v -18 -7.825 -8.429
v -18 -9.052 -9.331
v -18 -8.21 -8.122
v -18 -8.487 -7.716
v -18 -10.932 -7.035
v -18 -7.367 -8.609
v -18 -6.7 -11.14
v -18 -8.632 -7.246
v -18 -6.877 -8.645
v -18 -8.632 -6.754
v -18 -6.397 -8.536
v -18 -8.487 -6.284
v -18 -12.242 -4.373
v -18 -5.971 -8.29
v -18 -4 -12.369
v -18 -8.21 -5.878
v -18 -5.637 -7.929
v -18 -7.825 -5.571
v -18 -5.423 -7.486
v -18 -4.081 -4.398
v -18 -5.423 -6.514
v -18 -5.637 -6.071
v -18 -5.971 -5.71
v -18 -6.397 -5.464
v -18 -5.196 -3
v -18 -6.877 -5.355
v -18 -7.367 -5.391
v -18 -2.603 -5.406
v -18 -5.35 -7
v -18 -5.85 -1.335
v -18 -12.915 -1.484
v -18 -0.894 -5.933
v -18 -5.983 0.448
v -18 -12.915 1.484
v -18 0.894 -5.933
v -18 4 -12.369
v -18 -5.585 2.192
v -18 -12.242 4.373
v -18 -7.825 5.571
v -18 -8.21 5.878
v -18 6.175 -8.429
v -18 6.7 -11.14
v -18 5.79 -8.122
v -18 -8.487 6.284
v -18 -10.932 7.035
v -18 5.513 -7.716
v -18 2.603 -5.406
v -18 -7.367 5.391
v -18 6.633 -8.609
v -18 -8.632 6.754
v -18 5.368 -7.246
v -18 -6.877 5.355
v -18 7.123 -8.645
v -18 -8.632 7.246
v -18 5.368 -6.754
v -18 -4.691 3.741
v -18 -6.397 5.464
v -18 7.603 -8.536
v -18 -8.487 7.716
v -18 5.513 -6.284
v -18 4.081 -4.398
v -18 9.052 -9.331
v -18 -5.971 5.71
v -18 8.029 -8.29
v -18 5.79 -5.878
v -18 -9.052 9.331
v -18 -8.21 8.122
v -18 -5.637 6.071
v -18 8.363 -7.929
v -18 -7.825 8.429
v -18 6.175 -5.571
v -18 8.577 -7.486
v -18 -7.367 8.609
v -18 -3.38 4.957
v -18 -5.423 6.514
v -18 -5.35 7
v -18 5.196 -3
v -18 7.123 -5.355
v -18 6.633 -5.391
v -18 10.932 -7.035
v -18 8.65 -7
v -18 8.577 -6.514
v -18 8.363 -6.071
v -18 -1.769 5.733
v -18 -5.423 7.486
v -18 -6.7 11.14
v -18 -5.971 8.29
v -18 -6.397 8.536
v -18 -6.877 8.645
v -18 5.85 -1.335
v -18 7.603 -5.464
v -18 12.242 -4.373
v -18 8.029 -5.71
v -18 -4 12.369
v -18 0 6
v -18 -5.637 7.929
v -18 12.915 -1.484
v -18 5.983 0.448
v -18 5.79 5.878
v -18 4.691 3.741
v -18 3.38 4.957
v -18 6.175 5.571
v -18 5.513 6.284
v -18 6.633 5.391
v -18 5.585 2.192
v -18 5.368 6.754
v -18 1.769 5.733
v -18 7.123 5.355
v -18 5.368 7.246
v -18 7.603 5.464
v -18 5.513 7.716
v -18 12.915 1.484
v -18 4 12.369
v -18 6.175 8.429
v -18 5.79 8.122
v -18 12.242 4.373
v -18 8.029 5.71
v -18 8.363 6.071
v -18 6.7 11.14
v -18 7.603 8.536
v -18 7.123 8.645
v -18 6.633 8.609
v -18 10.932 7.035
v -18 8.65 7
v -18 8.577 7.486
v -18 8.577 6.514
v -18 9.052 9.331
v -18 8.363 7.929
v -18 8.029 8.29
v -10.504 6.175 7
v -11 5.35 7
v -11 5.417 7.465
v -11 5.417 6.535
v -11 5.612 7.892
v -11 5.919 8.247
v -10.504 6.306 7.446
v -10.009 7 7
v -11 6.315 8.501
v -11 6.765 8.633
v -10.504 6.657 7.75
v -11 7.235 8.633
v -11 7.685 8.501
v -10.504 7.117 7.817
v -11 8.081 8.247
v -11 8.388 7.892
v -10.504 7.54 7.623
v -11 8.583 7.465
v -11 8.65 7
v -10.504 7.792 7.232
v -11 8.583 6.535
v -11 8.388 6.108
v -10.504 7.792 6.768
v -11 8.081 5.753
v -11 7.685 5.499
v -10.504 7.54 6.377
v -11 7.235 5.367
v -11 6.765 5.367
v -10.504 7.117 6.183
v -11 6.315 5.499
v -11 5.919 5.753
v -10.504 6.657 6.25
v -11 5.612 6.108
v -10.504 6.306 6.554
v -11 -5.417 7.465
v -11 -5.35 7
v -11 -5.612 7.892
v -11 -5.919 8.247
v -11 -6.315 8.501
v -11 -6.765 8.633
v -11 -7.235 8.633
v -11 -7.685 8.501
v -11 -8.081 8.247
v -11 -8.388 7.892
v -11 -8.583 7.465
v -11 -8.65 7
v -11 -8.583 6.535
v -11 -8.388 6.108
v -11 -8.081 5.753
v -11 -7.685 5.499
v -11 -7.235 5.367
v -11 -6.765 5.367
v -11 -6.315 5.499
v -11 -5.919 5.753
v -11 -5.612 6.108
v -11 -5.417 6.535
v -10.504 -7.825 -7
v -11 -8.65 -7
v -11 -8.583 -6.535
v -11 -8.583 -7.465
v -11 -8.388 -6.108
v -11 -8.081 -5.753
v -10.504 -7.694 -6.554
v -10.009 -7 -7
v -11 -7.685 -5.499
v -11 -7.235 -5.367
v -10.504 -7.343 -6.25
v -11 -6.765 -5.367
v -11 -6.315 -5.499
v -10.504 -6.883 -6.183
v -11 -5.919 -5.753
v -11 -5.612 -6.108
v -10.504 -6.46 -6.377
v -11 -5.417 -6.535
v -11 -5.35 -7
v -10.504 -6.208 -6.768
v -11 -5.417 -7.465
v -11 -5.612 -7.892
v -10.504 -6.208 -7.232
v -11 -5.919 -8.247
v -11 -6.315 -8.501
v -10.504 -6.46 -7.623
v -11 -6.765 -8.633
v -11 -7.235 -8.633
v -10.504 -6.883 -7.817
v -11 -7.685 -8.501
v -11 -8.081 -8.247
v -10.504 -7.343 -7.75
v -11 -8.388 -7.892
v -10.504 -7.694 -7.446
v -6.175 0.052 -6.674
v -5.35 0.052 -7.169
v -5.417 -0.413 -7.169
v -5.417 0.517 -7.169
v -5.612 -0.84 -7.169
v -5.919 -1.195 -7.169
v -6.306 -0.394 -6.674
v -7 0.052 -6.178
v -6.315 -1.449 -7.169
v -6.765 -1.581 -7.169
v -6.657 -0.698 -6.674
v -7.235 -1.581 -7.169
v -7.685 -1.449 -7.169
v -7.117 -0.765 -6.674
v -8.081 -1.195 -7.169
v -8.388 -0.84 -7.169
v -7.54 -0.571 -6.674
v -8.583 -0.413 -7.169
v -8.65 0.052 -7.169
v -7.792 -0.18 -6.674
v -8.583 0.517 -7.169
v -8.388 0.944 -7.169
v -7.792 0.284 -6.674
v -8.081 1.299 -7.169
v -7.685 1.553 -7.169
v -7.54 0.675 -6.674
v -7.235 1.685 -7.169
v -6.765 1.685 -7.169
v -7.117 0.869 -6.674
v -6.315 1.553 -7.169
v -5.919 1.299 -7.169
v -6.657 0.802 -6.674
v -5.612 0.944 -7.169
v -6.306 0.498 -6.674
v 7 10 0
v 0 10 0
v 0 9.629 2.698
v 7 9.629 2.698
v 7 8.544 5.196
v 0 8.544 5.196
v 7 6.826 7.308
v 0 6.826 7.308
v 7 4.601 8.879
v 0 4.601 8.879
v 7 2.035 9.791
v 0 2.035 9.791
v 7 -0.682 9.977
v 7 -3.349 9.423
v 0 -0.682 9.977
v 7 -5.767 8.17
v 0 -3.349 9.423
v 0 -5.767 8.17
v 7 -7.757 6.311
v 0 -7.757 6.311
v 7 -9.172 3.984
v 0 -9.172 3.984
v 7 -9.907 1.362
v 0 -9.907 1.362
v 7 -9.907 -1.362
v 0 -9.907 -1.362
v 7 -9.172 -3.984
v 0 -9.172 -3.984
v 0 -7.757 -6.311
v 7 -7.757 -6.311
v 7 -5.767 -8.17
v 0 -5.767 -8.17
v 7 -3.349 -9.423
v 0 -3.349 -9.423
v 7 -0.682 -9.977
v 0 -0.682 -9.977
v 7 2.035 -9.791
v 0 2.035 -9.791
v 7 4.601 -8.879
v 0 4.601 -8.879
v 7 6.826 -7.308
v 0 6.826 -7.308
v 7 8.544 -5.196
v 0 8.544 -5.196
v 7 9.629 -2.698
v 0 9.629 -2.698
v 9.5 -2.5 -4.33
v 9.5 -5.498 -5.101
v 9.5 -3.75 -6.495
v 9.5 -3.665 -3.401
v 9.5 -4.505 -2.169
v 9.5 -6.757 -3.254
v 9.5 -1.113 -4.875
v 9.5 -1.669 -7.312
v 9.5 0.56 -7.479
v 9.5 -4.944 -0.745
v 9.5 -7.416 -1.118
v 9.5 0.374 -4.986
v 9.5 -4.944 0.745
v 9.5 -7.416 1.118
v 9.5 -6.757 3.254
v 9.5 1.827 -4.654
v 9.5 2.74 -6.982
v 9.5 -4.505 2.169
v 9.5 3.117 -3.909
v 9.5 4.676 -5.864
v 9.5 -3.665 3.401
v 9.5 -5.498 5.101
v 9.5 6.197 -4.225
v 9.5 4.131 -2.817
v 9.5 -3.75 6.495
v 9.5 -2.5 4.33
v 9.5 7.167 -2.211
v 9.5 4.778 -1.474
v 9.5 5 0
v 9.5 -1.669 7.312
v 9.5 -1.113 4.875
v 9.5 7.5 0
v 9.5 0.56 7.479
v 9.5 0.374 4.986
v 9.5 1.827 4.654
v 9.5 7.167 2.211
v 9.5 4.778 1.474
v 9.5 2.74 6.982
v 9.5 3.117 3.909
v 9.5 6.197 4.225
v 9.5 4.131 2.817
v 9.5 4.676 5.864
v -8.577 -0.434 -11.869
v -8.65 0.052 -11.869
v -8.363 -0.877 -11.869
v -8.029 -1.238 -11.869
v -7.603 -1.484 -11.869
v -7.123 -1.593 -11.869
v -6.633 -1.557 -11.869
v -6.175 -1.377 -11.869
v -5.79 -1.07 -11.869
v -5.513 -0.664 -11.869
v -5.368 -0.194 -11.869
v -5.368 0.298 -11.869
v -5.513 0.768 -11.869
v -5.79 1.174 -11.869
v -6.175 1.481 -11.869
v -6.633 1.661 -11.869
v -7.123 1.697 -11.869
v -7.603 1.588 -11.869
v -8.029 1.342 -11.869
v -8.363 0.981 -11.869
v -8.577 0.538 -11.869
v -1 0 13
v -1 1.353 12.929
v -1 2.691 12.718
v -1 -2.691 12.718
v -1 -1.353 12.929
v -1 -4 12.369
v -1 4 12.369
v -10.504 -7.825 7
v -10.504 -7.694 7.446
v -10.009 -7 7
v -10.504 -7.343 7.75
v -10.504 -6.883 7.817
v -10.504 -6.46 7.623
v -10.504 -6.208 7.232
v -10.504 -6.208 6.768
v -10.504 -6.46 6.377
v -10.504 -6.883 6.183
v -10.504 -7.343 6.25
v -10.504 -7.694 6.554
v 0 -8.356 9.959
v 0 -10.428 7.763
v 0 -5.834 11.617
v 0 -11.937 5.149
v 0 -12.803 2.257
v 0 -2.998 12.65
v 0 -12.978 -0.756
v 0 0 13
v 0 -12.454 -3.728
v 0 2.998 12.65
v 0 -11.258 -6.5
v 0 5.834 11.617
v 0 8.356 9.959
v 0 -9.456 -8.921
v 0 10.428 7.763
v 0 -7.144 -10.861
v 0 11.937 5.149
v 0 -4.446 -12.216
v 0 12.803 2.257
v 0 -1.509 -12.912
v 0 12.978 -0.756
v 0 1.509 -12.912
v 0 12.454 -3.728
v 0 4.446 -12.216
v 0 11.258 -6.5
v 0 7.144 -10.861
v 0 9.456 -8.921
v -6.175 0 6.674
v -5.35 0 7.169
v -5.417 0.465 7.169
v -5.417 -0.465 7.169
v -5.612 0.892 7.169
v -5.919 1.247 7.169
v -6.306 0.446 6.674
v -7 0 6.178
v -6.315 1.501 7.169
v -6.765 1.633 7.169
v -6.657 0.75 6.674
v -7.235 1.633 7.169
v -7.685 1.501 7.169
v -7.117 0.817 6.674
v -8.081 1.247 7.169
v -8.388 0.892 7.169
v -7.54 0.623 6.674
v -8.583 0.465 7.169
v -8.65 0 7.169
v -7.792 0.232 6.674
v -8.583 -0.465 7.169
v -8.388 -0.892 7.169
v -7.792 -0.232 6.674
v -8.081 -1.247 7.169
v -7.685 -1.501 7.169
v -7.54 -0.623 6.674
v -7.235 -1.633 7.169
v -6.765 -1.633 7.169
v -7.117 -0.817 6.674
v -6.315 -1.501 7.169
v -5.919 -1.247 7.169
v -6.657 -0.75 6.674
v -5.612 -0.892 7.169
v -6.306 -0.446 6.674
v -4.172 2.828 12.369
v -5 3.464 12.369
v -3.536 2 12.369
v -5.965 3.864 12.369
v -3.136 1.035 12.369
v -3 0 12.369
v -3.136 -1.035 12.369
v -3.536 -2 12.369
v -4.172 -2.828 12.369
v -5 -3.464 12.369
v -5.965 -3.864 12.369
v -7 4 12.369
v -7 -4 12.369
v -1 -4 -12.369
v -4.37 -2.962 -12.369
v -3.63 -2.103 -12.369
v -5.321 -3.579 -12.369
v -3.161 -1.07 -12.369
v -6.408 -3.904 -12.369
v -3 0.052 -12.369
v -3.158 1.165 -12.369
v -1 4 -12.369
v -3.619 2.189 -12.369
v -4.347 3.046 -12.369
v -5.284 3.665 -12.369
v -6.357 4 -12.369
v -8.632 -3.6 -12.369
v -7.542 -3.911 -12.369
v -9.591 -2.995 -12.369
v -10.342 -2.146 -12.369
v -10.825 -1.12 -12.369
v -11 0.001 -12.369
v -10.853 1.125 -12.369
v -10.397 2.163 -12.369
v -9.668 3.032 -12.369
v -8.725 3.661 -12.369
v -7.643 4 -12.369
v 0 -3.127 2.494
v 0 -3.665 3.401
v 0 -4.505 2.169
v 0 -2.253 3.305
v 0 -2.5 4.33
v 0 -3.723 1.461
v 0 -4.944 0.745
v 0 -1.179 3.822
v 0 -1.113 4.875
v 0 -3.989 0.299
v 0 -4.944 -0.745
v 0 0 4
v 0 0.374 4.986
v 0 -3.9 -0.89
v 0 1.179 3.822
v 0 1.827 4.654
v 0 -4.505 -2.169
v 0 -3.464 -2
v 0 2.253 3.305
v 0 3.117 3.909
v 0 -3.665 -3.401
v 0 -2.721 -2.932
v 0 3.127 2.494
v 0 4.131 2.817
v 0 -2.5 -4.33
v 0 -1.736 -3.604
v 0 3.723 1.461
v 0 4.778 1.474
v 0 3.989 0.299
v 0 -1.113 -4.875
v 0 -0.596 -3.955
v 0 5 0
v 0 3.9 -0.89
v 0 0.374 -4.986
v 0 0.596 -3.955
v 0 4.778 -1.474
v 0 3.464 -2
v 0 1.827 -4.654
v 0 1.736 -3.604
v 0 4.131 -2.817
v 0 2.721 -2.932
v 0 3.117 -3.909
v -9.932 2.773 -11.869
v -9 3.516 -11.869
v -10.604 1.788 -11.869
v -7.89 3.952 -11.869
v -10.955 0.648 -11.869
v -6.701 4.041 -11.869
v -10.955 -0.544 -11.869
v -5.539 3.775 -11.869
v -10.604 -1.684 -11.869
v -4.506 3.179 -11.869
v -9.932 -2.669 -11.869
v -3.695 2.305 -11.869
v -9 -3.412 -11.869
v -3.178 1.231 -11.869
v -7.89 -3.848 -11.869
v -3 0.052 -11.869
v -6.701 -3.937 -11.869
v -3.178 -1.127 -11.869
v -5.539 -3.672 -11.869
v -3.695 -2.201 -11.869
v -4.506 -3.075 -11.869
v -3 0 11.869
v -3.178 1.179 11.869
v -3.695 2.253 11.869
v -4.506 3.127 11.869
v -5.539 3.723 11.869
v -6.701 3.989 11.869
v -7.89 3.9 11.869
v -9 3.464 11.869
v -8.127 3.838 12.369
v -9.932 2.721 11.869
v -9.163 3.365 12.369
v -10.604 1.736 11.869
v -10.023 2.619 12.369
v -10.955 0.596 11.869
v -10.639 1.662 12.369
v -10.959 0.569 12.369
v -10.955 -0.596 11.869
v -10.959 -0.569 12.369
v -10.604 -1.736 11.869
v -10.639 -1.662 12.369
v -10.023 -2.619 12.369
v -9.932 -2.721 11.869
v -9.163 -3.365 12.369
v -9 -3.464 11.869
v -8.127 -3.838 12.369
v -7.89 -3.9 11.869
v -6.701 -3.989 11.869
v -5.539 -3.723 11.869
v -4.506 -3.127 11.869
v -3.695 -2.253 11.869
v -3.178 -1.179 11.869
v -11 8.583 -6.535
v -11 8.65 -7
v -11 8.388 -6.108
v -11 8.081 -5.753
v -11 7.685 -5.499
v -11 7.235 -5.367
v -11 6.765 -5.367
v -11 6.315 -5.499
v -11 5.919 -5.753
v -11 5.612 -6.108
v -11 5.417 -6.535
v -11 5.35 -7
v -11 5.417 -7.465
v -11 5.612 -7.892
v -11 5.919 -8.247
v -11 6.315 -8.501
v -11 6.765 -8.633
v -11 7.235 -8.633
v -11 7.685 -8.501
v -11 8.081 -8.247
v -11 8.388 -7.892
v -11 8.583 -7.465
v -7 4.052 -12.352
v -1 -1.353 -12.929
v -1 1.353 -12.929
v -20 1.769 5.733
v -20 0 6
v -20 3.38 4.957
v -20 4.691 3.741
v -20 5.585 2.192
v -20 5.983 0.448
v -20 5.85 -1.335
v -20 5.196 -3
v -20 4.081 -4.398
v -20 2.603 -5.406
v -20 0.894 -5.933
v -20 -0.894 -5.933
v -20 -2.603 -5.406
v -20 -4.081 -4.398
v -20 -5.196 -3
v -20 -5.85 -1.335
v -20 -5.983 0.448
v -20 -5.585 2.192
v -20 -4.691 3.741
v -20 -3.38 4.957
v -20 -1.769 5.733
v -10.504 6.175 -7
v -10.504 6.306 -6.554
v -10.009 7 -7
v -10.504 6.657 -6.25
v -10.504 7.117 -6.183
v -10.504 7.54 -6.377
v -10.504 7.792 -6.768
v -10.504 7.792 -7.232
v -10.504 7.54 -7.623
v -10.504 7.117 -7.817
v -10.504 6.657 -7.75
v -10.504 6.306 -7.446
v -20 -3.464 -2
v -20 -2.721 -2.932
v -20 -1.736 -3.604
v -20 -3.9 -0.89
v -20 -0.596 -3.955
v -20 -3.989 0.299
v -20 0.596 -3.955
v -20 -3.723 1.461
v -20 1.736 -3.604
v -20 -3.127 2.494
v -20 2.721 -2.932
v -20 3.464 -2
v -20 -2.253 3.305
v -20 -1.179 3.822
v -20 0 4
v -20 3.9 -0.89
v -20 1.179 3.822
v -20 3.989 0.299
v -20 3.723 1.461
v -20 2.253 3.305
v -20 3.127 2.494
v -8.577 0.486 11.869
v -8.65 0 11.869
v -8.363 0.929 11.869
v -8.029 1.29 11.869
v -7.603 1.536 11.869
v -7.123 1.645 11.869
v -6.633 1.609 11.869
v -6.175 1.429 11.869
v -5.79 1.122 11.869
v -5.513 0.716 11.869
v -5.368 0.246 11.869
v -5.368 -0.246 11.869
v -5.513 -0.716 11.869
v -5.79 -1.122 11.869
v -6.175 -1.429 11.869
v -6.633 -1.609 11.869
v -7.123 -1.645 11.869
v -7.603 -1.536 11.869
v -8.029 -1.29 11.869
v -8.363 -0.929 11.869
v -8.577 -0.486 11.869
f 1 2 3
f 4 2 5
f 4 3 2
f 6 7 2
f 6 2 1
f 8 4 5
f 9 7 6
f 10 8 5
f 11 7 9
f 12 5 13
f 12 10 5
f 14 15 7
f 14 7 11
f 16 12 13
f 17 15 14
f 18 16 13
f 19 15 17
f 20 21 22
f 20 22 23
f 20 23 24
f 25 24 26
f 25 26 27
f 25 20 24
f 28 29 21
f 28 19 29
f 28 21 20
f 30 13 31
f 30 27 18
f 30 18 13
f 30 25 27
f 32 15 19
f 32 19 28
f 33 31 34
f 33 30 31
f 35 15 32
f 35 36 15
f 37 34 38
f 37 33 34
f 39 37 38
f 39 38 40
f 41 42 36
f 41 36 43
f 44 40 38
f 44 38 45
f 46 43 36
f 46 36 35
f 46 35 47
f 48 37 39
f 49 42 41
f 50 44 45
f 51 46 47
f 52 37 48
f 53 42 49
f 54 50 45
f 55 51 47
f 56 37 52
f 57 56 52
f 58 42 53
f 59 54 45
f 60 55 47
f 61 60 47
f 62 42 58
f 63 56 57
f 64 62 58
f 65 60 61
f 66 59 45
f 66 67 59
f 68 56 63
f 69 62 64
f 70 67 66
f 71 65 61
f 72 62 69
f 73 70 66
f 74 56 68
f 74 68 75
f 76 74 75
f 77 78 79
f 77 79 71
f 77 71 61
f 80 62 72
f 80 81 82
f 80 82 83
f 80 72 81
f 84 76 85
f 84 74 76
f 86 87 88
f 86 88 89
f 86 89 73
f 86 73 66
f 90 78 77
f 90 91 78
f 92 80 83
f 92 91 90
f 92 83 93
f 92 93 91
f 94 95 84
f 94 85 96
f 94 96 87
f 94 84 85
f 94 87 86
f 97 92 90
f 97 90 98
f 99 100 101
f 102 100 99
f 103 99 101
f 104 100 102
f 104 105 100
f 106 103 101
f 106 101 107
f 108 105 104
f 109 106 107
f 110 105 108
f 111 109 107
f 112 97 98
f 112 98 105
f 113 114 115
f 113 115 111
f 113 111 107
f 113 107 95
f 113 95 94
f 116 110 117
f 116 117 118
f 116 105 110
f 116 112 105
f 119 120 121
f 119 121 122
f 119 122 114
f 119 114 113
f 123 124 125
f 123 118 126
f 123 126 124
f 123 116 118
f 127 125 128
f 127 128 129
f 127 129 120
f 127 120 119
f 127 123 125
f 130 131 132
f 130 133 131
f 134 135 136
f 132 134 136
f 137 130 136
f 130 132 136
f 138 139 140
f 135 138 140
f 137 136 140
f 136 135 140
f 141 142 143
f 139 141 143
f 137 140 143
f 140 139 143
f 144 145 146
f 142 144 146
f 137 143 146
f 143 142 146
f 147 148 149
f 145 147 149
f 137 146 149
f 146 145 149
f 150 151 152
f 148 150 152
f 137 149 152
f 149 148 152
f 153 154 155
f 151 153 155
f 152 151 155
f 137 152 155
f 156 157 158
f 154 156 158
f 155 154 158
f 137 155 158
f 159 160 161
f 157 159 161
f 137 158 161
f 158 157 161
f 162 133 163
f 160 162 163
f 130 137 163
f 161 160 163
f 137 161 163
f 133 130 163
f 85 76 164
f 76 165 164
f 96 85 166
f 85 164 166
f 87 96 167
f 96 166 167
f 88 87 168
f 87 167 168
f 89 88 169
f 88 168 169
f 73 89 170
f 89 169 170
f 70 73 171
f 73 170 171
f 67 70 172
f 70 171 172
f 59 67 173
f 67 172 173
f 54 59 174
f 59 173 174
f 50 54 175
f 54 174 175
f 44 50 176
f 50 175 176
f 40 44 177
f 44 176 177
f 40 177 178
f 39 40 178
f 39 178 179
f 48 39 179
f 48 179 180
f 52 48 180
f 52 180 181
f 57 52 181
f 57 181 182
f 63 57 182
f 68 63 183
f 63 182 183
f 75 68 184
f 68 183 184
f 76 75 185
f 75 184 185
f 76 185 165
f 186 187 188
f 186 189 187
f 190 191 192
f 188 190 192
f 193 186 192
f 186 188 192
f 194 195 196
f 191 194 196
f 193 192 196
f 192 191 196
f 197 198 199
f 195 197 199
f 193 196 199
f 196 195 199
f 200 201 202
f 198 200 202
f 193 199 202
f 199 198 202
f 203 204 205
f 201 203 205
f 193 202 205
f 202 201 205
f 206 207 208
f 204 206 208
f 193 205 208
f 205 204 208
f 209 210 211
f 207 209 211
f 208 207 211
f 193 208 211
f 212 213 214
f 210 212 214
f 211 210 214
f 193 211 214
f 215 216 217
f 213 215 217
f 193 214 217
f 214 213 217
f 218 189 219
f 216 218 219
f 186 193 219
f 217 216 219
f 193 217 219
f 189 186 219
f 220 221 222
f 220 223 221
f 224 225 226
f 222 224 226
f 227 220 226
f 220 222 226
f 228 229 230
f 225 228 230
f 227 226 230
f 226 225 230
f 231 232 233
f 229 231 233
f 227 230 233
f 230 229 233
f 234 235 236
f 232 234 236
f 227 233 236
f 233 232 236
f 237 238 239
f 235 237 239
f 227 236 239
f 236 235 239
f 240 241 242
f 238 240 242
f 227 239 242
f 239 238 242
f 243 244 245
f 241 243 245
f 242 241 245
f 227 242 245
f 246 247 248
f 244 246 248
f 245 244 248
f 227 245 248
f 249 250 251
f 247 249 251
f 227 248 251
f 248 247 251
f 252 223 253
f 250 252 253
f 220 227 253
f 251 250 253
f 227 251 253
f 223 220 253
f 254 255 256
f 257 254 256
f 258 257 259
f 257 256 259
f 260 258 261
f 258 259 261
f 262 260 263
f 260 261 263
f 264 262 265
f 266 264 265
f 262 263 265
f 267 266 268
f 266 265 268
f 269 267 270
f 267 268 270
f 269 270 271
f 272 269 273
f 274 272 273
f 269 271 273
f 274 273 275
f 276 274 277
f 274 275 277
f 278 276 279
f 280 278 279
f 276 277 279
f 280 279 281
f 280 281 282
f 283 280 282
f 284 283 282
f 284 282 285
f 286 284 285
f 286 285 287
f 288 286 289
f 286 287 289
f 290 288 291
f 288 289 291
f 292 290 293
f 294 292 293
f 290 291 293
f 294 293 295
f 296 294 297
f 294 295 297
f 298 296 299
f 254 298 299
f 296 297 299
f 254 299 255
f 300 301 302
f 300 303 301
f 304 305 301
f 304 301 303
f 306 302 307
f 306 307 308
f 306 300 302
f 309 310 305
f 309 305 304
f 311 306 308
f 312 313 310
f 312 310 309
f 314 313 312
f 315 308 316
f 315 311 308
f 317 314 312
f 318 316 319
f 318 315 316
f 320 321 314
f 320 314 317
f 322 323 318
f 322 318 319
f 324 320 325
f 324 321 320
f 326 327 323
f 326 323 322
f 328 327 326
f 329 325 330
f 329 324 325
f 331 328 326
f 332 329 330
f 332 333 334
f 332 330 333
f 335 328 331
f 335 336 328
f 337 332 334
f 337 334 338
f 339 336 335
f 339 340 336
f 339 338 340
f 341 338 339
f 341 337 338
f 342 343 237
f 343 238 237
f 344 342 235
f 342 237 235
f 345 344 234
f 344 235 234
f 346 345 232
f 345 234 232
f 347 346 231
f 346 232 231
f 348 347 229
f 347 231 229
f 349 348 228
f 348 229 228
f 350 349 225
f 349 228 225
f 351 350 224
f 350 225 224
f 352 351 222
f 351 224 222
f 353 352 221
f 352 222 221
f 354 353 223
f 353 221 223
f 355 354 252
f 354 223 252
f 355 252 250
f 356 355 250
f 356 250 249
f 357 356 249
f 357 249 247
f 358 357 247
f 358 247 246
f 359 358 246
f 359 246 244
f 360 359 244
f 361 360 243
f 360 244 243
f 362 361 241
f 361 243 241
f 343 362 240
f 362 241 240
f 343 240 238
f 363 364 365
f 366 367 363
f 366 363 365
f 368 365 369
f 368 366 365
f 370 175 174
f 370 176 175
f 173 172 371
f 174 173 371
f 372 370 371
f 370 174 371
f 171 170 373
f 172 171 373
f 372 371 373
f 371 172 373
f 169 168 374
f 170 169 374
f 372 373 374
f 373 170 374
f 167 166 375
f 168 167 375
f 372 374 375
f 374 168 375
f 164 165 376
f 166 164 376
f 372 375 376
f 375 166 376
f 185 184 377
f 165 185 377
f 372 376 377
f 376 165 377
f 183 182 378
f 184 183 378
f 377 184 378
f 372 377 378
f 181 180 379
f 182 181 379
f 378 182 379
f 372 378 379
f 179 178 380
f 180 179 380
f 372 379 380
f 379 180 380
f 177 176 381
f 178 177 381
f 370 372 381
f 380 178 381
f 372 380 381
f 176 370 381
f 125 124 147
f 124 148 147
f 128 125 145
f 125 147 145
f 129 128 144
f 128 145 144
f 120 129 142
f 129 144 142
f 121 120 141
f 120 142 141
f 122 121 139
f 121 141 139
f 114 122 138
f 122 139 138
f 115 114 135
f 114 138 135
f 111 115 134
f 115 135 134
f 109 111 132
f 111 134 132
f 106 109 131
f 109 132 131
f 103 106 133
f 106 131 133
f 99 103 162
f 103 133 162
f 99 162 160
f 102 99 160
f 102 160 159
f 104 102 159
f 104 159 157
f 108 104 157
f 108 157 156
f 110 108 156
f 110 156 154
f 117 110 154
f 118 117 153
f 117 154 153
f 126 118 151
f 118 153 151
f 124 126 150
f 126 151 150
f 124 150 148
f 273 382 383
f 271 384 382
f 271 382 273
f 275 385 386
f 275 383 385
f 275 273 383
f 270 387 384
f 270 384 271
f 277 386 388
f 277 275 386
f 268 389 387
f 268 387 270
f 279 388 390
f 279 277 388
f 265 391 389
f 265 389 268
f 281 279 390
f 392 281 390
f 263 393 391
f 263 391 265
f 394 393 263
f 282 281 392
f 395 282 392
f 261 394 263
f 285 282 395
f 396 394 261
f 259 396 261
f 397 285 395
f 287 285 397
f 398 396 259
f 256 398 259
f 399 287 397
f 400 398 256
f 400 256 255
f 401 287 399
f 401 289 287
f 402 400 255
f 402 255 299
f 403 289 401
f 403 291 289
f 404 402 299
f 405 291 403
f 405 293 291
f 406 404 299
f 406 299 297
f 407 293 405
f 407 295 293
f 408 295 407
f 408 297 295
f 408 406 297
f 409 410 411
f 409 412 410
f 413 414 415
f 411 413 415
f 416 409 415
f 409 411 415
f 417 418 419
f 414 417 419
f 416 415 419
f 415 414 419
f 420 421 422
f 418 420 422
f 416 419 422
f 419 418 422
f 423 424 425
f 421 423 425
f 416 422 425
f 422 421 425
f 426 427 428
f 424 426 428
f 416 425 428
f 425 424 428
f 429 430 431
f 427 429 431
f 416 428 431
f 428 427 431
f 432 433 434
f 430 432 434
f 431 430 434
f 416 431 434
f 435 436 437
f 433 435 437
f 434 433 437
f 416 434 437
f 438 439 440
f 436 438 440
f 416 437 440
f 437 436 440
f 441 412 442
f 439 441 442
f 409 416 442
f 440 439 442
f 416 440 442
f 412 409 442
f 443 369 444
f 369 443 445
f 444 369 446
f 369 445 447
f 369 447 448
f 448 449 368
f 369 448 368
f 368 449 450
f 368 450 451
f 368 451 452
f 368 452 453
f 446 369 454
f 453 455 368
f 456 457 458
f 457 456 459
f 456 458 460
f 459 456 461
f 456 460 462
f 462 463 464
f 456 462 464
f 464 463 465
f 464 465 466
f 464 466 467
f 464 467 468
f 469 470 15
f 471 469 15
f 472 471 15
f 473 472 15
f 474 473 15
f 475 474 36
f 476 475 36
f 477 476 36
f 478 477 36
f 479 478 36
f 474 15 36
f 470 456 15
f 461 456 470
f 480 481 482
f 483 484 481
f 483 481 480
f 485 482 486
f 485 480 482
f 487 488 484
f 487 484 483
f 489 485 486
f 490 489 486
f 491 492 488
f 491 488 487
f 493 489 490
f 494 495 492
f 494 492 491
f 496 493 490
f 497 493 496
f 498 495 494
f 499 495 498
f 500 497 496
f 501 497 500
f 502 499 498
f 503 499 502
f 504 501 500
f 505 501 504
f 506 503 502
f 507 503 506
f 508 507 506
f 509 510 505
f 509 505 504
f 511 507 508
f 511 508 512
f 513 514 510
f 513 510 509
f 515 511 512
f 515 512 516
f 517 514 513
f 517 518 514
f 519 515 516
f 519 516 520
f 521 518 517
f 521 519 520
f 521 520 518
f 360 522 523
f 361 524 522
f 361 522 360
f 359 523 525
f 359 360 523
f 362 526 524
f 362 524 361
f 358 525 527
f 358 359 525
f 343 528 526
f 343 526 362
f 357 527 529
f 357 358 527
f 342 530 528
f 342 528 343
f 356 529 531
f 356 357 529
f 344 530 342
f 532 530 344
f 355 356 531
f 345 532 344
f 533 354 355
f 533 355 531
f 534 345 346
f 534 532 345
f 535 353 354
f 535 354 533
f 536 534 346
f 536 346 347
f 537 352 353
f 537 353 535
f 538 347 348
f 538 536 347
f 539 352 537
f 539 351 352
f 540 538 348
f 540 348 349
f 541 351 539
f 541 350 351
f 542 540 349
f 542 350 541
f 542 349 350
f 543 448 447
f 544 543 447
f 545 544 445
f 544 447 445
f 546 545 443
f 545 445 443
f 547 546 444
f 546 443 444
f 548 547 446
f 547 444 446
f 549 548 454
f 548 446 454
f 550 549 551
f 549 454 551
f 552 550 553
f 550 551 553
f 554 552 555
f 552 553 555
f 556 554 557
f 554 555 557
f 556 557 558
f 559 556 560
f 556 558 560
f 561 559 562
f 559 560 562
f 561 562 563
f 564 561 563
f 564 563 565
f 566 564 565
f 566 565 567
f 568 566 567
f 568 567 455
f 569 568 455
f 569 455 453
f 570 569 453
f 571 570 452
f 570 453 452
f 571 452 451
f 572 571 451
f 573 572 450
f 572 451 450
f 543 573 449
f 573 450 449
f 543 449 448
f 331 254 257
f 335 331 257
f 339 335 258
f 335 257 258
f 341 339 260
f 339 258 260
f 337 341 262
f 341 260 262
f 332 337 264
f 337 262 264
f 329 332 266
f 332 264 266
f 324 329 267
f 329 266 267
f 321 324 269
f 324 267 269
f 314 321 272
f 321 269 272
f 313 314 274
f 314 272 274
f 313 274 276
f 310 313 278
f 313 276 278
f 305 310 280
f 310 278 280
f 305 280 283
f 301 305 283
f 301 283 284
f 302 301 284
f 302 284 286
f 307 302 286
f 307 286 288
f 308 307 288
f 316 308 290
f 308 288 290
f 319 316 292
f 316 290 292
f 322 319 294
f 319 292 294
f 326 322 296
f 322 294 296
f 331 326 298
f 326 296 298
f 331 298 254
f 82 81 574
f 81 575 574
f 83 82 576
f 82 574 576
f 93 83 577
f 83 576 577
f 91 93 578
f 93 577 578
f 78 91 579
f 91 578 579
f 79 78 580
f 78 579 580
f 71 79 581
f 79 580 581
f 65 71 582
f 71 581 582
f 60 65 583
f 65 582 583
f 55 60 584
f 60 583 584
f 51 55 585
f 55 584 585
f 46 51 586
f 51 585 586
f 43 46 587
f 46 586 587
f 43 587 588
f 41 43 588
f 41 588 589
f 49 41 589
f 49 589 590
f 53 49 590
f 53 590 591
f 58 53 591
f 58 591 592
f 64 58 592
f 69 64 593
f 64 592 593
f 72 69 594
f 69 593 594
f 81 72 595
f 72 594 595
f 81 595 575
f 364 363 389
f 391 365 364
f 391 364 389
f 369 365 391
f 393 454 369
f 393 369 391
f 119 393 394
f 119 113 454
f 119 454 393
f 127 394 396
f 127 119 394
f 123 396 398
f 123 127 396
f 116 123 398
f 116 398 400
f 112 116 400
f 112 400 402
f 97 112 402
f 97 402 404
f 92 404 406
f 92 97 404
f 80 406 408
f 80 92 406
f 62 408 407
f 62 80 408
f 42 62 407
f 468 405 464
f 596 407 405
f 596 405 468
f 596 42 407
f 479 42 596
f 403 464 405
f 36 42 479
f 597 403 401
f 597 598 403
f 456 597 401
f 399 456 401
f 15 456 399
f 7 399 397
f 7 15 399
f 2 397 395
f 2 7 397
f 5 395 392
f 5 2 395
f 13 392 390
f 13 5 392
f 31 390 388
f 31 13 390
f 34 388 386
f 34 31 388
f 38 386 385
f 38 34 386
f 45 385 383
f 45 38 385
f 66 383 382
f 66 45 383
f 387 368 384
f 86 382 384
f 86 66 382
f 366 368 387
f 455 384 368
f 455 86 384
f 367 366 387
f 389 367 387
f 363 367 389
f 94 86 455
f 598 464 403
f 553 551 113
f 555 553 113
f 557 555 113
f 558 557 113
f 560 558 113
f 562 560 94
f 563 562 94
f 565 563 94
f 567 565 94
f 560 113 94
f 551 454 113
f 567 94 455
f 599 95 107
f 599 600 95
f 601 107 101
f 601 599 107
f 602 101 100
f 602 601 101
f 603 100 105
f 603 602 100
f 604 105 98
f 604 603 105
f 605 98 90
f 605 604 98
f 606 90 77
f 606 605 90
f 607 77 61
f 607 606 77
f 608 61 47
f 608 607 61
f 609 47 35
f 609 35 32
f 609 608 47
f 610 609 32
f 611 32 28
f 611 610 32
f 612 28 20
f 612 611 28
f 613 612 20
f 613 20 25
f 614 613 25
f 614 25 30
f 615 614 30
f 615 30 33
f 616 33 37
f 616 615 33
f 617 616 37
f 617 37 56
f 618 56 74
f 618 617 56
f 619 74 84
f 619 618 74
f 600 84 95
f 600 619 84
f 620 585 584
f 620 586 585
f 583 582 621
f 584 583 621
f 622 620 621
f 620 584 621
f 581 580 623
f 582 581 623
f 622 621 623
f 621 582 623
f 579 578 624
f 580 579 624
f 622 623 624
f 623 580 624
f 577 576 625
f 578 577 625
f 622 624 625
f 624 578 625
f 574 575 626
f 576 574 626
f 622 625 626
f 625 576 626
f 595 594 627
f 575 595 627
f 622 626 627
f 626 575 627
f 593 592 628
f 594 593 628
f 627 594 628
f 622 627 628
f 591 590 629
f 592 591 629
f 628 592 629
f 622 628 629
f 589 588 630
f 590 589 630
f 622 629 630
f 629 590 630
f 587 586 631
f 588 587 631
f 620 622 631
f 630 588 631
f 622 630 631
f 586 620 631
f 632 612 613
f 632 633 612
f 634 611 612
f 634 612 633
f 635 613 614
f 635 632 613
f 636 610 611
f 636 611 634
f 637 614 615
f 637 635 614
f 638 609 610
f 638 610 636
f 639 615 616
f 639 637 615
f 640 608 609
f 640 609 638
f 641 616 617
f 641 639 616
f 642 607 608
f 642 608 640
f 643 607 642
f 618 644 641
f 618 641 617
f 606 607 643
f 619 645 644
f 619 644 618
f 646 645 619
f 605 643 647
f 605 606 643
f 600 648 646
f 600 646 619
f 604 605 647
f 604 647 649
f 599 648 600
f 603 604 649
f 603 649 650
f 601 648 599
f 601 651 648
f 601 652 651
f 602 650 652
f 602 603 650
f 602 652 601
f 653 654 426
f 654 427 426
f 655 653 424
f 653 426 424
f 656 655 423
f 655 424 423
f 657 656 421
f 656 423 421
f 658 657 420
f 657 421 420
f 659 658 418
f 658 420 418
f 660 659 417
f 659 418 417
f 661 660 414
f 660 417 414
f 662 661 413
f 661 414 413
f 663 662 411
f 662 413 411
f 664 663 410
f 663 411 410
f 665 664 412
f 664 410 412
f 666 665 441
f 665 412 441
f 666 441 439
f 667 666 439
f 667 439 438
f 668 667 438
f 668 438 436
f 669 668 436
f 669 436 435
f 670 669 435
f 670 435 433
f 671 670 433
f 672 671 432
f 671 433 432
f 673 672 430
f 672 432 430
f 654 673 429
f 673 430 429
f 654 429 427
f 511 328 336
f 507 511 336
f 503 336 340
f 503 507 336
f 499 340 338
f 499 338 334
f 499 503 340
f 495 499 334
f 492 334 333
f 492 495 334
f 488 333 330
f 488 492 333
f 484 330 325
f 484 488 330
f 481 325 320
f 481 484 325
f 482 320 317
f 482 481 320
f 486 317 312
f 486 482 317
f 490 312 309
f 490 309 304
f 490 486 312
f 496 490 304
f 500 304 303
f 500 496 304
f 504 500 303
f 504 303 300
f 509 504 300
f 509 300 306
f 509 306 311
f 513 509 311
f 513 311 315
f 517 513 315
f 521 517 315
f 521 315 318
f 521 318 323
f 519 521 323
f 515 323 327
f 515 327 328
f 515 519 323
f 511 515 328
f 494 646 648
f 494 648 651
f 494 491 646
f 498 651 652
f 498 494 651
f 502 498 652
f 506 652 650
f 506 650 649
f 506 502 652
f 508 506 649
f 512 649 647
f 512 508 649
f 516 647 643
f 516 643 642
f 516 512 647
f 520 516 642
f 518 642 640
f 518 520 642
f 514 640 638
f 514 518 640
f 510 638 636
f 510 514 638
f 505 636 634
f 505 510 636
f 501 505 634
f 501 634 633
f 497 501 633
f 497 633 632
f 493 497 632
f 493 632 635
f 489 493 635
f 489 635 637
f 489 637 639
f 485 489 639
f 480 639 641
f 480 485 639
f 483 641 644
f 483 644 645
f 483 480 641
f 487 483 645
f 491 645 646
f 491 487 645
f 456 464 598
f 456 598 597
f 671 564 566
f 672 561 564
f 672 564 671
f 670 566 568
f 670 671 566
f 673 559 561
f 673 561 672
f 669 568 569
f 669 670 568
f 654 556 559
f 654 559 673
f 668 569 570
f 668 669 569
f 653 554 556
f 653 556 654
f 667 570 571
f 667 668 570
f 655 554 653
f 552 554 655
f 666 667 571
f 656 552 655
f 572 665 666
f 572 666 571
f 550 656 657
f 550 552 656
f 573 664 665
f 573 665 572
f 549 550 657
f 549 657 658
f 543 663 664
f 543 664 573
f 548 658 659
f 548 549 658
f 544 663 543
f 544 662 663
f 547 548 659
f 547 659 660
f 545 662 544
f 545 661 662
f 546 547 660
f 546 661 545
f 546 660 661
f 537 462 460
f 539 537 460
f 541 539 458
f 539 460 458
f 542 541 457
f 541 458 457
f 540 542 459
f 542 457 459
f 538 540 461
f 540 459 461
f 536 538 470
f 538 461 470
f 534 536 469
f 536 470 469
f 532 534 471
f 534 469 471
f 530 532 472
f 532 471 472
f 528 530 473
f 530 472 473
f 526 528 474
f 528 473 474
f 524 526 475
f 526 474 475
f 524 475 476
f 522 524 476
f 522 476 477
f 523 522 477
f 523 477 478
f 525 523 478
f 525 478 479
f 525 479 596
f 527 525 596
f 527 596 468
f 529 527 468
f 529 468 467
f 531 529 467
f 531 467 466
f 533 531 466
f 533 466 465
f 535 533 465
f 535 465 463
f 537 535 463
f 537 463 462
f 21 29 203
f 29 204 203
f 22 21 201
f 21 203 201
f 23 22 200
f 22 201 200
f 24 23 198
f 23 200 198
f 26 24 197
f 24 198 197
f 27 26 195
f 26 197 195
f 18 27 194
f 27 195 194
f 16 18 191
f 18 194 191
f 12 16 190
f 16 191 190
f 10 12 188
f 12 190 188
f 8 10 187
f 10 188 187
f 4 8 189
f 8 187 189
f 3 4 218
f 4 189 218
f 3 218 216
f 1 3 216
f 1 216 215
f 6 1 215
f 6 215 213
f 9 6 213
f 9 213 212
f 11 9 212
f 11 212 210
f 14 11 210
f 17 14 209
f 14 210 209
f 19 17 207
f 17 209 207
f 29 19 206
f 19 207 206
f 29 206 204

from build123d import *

# Parameters (mm, degrees)
F3_D      = 3.3
F3_DEPTH  = 7
F3_TIP    = 0.9914200214
F4_R      = 10
F4_R_2    = 5
F5_DEPTH  = 9.5
F6_SIZE   = 2.5
F8_DEPTH  = 17
F10_D     = 3.3
F10_DEPTH = 5.2
F10_TIP   = 0.9914200214
F11_R     = 4
F12_DEPTH = 0.5
F14_D     = 3.3
F14_DEPTH = 5.2
F14_TIP   = 0.9914200214
F15_R     = 4
F16_DEPTH = 0.5


with BuildPart() as f1:
    # F0 (on Front) → F1 (revolve)
    with BuildSketch(Plane.XZ):
        Polygon((-20, 4), (0, 4), (0, 13), (-18, 13), (-18, 6), (-20, 6), align=None)
    revolve(axis=Axis((-7.6375159387, 0, 0), (-1, 0, 0)))

    # F3
    with Locations(Plane(origin=(-18, 0, 0), x_dir=(0, -1, 0), z_dir=(-1, 0, 0))):
        with Locations((-7, 7), (7, 7), (-7, -7), (7, -7)):
            Hole(F3_D / 2, depth=F3_DEPTH)
            with Locations((0, 0, -(F3_DEPTH + F3_TIP / 2))):  # 118° drill point
                Cone(0, F3_D / 2, F3_TIP, mode=Mode.SUBTRACT)

    # F4 (on face) → F5 (join)
    with BuildSketch(Plane.YZ):
        Circle(F4_R)
        Circle(F4_R_2, mode=Mode.SUBTRACT)
    extrude(amount=F5_DEPTH)

    # F6
    f6_edges = [f1.edges().sort_by_distance(p)[0] for p in [
        (9.5, -10, 0),
    ]]
    chamfer(f6_edges, length=F6_SIZE)

    # F7 (on face) → F8 (cut)
    with BuildSketch(Plane(origin=(-18, 0, 0), x_dir=(0, -1, 0), z_dir=(-1, 0, 0))):
        with BuildLine():
            Line((-4, 12.3693168769), (4, 12.3693168769))
            ThreePointArc((4, 12.3693168769), (0, 13), (-4, 12.3693168769))
        make_face()
        with BuildLine():
            Line((4, -12.3693168769), (-4, -12.3693168769))
            ThreePointArc((-4, -12.3693168769), (0, -13), (4, -12.3693168769))
        make_face()
    extrude(amount=-F8_DEPTH, mode=Mode.SUBTRACT)

    # F10
    with Locations(Plane.XY.offset(12.3693168769)):
        with Locations((-7, 0)):
            Hole(F10_D / 2, depth=F10_DEPTH)
            with Locations((0, 0, -(F10_DEPTH + F10_TIP / 2))):  # 118° drill point
                Cone(0, F10_D / 2, F10_TIP, mode=Mode.SUBTRACT)

    # F11 (on face) → F12 (cut)
    with BuildSketch(Plane.XY.offset(12.3693168769)):
        with Locations((-7, 0)):
            Circle(F11_R)
    extrude(amount=-F12_DEPTH, mode=Mode.SUBTRACT)

    # F14
    with Locations(Plane(origin=(0, 0, -12.3693168769), x_dir=(1, 0, 0), z_dir=(0, 0, -1))):
        with Locations((-7, -0.0519943278)):
            Hole(F14_D / 2, depth=F14_DEPTH)
            with Locations((0, 0, -(F14_DEPTH + F14_TIP / 2))):  # 118° drill point
                Cone(0, F14_D / 2, F14_TIP, mode=Mode.SUBTRACT)

    # F15 (on face) → F16 (cut)
    with BuildSketch(Plane(origin=(0, 0, -12.3693168769), x_dir=(1, 0, 0), z_dir=(0, 0, -1))):
        with Locations((-7, -0.0519943278)):
            Circle(F15_R)
    extrude(amount=-F16_DEPTH, mode=Mode.SUBTRACT)


solid = f1.part
